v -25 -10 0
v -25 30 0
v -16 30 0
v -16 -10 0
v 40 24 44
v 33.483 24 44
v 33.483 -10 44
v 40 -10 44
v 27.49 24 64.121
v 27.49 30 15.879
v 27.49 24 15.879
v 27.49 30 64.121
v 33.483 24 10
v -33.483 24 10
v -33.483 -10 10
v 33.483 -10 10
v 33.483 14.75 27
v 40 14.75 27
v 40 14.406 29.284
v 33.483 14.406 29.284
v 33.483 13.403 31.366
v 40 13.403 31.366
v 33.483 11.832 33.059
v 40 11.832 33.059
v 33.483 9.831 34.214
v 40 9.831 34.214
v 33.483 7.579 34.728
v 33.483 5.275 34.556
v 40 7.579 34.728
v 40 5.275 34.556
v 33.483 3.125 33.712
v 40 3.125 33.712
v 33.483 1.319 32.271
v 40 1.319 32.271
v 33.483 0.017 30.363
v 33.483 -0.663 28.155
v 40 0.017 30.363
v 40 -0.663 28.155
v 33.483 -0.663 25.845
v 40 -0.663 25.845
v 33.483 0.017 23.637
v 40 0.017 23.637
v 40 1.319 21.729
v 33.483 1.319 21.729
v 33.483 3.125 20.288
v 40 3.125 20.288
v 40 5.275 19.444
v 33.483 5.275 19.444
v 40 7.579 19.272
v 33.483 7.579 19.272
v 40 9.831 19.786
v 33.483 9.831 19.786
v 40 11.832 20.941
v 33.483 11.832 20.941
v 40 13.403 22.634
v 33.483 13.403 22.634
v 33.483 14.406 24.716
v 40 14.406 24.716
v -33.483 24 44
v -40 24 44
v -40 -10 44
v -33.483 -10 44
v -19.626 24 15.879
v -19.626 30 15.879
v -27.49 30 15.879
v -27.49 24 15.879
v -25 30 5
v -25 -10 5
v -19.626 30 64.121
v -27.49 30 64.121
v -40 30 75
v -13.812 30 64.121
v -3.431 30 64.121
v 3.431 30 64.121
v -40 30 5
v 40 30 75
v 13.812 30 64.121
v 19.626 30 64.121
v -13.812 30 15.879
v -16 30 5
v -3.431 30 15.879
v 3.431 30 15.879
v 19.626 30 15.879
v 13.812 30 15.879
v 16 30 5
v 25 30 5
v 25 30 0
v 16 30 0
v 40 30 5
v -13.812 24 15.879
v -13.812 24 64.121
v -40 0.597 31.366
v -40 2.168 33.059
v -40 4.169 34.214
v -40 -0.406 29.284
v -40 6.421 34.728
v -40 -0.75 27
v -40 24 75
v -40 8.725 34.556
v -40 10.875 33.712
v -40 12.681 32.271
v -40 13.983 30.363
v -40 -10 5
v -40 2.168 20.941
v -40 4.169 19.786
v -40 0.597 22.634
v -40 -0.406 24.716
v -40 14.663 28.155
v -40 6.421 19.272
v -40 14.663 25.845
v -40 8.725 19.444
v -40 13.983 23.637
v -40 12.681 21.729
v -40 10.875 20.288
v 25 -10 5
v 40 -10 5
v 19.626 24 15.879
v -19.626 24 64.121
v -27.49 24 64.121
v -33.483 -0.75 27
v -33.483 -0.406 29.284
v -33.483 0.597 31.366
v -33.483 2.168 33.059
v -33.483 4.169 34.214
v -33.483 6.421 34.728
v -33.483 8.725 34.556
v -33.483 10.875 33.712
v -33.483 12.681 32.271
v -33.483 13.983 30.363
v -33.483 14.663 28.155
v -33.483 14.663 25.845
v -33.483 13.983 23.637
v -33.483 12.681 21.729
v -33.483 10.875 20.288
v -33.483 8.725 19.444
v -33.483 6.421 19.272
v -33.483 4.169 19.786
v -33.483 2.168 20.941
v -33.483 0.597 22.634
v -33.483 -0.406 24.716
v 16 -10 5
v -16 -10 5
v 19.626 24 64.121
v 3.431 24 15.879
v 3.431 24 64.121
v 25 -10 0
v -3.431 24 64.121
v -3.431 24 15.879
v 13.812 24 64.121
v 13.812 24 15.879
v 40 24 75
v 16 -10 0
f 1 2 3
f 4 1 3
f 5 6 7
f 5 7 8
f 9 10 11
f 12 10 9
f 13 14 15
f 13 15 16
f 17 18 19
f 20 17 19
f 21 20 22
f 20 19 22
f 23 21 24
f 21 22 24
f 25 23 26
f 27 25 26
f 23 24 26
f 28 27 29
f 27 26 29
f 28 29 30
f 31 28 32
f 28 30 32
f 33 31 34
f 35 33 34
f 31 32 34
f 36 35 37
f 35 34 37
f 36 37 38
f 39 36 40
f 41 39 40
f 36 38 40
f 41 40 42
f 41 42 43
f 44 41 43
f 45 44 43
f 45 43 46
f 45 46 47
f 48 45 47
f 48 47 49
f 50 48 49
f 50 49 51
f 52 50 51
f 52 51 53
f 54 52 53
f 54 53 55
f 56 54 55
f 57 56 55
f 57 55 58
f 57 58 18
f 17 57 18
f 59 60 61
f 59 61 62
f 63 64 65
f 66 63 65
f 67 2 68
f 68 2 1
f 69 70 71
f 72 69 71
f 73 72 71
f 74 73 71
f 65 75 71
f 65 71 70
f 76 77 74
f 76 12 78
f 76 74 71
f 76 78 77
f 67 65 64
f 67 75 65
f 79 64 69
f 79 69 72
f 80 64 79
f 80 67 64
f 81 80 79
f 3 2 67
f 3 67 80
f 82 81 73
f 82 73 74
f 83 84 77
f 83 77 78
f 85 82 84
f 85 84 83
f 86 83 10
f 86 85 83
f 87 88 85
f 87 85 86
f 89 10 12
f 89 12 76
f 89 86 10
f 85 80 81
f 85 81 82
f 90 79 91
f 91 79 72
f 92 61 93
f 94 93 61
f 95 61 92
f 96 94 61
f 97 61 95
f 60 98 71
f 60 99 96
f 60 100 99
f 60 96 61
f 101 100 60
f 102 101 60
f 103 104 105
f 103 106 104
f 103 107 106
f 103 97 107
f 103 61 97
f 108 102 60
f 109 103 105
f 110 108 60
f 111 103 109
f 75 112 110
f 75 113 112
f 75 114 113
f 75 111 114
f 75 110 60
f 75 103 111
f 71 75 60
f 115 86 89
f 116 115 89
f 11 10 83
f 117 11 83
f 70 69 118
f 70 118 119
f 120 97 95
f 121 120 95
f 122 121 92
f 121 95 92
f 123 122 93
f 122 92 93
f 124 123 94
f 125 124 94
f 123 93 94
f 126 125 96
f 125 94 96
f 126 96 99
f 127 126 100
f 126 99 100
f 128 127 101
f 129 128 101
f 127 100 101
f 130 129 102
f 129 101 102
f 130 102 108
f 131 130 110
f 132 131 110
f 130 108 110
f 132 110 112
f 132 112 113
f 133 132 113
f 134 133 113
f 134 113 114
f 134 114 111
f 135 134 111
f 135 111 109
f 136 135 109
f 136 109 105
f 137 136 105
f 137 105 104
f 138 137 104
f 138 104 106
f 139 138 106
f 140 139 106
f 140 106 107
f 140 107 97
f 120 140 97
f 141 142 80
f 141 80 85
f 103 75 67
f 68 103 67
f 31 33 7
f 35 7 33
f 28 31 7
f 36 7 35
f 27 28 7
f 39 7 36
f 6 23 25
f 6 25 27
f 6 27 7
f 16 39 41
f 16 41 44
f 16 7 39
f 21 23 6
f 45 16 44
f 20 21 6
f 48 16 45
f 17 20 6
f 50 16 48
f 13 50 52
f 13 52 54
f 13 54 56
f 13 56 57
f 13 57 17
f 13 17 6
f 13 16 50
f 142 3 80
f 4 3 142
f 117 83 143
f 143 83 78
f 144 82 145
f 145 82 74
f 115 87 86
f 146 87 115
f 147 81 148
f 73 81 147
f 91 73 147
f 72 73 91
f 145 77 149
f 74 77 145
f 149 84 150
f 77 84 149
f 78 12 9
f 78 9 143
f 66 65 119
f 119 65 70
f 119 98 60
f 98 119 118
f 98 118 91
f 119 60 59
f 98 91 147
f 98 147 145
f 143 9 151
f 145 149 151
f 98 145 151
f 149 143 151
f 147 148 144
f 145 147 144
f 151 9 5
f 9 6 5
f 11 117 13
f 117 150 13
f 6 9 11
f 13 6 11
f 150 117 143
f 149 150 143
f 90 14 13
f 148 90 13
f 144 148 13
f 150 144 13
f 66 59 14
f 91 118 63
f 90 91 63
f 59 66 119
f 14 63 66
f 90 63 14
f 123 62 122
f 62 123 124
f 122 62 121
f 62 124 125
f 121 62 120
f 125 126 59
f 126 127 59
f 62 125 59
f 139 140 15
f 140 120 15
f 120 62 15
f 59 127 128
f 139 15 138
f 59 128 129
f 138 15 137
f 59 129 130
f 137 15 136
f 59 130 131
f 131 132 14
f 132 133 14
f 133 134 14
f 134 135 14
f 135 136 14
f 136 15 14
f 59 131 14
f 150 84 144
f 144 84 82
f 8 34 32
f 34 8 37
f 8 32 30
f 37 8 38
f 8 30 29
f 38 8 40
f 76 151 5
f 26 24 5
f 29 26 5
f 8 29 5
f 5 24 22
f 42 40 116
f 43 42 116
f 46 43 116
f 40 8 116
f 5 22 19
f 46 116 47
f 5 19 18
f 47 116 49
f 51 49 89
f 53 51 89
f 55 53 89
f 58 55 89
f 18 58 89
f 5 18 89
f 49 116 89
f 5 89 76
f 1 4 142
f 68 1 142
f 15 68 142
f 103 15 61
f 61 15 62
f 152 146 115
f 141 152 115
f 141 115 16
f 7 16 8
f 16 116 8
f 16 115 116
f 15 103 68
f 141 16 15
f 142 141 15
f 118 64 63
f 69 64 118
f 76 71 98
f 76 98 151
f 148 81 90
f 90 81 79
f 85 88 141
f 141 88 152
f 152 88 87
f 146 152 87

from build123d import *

# Parameters (mm, degrees)
F0_W      = 80
F0_H      = 60
F1_DEPTH  = 10
F2_W      = 15
F2_H      = 60
F2_W_2    = 32
F3_DEPTH  = 5
F4_W      = 80
F4_H      = 6
F5_DEPTH  = 65
F7_W      = 7.8638531268
F7_H      = 48.2417996228
F7_W_2    = 10.3811963927
F8_DEPTH  = 25
F9_W      = 6.5171729342
F9_H      = 34
F10_DEPTH = 34
F11_R     = 7.75
F13_DEPTH = 25
F14_W     = 20
F14_H     = 5
F15_DEPTH = 90
F16_W     = 20
F16_H     = 5
F17_DEPTH = 25
F18_W     = 20
F18_H     = 5
F19_DEPTH = 25
F12_R     = 7.75
F20_DEPTH = 25


with BuildPart() as f1:
    # F0 (on Top) → F1 (new body)
    with BuildSketch(Plane.XY):
        Rectangle(F0_W, F0_H)
    extrude(amount=F1_DEPTH)

    # F2 (on face) → F3 (cut)
    with BuildSketch(Plane(origin=(0, 0, 0), x_dir=(1, 0, 0), z_dir=(0, 0, -1))):
        with Locations((32.5, 0)):
            Rectangle(F2_W, F2_H)
        Rectangle(F2_W_2, F2_H)
        with Locations((-32.5, 0)):
            Rectangle(F2_W, F2_H)
    extrude(amount=-F3_DEPTH, mode=Mode.SUBTRACT)

    # F4 (on face) → F5 (join)
    with BuildSketch(Plane.XY.offset(10)):
        with Locations((0, 27)):
            Rectangle(F4_W, F4_H)
    extrude(amount=F5_DEPTH)

    # F7 (on face) → F8 (cut)
    with BuildSketch(Plane(origin=(0, 30, 0), x_dir=(-1, 0, 0), z_dir=(0, 1, 0))):
        with Locations((-23.5581696033, 40)):
            Rectangle(F7_W, F7_H)
        with Locations((-8.6212871829, 40)):
            Rectangle(F7_W_2, F7_H)
        with Locations((8.6212871829, 40)):
            Rectangle(F7_W_2, F7_H)
        with Locations((23.5581696033, 40)):
            Rectangle(F7_W, F7_H)
    extrude(amount=-F8_DEPTH, mode=Mode.SUBTRACT)

    # F9 (on face) → F10 (join)
    with BuildSketch(Plane.XY.offset(10)):
        with Locations((-36.7414135329, 7)):
            Rectangle(F9_W, F9_H)
        with Locations((36.7414135329, 7)):
            Rectangle(F9_W, F9_H)
    extrude(amount=F10_DEPTH)

    # F11 (on face) → F13 (cut)
    with BuildSketch(Plane(origin=(-40, 0, 0), x_dir=(0, -1, 0), z_dir=(-1, 0, 0))):
        with Locations((-7, 27)):
            Circle(F11_R)
    extrude(amount=-F13_DEPTH, mode=Mode.SUBTRACT)

    # F14 (on face) → F15 (cut)
    with BuildSketch(Plane.YZ.offset(40)):
        with Locations((-20, 7.5)):
            Rectangle(F14_W, F14_H)
    extrude(amount=-F15_DEPTH, mode=Mode.SUBTRACT)

    # F16 (on face) → F17 (cut)
    with BuildSketch(Plane.YZ.offset(25)):
        with Locations((-20, 2.5)):
            Rectangle(F16_W, F16_H)
    extrude(amount=-F17_DEPTH, mode=Mode.SUBTRACT)

    # F18 (on face) → F19 (cut)
    with BuildSketch(Plane(origin=(-25, 0, 0), x_dir=(0, -1, 0), z_dir=(-1, 0, 0))):
        with Locations((20, 2.5)):
            Rectangle(F18_W, F18_H)
    extrude(amount=-F19_DEPTH, mode=Mode.SUBTRACT)

    # F12 (on face) → F20 (cut)
    with BuildSketch(Plane.YZ.offset(40)):
        with Locations((7, 27)):
            Circle(F12_R)
    extrude(amount=-F20_DEPTH, mode=Mode.SUBTRACT)


solid = f1.part
